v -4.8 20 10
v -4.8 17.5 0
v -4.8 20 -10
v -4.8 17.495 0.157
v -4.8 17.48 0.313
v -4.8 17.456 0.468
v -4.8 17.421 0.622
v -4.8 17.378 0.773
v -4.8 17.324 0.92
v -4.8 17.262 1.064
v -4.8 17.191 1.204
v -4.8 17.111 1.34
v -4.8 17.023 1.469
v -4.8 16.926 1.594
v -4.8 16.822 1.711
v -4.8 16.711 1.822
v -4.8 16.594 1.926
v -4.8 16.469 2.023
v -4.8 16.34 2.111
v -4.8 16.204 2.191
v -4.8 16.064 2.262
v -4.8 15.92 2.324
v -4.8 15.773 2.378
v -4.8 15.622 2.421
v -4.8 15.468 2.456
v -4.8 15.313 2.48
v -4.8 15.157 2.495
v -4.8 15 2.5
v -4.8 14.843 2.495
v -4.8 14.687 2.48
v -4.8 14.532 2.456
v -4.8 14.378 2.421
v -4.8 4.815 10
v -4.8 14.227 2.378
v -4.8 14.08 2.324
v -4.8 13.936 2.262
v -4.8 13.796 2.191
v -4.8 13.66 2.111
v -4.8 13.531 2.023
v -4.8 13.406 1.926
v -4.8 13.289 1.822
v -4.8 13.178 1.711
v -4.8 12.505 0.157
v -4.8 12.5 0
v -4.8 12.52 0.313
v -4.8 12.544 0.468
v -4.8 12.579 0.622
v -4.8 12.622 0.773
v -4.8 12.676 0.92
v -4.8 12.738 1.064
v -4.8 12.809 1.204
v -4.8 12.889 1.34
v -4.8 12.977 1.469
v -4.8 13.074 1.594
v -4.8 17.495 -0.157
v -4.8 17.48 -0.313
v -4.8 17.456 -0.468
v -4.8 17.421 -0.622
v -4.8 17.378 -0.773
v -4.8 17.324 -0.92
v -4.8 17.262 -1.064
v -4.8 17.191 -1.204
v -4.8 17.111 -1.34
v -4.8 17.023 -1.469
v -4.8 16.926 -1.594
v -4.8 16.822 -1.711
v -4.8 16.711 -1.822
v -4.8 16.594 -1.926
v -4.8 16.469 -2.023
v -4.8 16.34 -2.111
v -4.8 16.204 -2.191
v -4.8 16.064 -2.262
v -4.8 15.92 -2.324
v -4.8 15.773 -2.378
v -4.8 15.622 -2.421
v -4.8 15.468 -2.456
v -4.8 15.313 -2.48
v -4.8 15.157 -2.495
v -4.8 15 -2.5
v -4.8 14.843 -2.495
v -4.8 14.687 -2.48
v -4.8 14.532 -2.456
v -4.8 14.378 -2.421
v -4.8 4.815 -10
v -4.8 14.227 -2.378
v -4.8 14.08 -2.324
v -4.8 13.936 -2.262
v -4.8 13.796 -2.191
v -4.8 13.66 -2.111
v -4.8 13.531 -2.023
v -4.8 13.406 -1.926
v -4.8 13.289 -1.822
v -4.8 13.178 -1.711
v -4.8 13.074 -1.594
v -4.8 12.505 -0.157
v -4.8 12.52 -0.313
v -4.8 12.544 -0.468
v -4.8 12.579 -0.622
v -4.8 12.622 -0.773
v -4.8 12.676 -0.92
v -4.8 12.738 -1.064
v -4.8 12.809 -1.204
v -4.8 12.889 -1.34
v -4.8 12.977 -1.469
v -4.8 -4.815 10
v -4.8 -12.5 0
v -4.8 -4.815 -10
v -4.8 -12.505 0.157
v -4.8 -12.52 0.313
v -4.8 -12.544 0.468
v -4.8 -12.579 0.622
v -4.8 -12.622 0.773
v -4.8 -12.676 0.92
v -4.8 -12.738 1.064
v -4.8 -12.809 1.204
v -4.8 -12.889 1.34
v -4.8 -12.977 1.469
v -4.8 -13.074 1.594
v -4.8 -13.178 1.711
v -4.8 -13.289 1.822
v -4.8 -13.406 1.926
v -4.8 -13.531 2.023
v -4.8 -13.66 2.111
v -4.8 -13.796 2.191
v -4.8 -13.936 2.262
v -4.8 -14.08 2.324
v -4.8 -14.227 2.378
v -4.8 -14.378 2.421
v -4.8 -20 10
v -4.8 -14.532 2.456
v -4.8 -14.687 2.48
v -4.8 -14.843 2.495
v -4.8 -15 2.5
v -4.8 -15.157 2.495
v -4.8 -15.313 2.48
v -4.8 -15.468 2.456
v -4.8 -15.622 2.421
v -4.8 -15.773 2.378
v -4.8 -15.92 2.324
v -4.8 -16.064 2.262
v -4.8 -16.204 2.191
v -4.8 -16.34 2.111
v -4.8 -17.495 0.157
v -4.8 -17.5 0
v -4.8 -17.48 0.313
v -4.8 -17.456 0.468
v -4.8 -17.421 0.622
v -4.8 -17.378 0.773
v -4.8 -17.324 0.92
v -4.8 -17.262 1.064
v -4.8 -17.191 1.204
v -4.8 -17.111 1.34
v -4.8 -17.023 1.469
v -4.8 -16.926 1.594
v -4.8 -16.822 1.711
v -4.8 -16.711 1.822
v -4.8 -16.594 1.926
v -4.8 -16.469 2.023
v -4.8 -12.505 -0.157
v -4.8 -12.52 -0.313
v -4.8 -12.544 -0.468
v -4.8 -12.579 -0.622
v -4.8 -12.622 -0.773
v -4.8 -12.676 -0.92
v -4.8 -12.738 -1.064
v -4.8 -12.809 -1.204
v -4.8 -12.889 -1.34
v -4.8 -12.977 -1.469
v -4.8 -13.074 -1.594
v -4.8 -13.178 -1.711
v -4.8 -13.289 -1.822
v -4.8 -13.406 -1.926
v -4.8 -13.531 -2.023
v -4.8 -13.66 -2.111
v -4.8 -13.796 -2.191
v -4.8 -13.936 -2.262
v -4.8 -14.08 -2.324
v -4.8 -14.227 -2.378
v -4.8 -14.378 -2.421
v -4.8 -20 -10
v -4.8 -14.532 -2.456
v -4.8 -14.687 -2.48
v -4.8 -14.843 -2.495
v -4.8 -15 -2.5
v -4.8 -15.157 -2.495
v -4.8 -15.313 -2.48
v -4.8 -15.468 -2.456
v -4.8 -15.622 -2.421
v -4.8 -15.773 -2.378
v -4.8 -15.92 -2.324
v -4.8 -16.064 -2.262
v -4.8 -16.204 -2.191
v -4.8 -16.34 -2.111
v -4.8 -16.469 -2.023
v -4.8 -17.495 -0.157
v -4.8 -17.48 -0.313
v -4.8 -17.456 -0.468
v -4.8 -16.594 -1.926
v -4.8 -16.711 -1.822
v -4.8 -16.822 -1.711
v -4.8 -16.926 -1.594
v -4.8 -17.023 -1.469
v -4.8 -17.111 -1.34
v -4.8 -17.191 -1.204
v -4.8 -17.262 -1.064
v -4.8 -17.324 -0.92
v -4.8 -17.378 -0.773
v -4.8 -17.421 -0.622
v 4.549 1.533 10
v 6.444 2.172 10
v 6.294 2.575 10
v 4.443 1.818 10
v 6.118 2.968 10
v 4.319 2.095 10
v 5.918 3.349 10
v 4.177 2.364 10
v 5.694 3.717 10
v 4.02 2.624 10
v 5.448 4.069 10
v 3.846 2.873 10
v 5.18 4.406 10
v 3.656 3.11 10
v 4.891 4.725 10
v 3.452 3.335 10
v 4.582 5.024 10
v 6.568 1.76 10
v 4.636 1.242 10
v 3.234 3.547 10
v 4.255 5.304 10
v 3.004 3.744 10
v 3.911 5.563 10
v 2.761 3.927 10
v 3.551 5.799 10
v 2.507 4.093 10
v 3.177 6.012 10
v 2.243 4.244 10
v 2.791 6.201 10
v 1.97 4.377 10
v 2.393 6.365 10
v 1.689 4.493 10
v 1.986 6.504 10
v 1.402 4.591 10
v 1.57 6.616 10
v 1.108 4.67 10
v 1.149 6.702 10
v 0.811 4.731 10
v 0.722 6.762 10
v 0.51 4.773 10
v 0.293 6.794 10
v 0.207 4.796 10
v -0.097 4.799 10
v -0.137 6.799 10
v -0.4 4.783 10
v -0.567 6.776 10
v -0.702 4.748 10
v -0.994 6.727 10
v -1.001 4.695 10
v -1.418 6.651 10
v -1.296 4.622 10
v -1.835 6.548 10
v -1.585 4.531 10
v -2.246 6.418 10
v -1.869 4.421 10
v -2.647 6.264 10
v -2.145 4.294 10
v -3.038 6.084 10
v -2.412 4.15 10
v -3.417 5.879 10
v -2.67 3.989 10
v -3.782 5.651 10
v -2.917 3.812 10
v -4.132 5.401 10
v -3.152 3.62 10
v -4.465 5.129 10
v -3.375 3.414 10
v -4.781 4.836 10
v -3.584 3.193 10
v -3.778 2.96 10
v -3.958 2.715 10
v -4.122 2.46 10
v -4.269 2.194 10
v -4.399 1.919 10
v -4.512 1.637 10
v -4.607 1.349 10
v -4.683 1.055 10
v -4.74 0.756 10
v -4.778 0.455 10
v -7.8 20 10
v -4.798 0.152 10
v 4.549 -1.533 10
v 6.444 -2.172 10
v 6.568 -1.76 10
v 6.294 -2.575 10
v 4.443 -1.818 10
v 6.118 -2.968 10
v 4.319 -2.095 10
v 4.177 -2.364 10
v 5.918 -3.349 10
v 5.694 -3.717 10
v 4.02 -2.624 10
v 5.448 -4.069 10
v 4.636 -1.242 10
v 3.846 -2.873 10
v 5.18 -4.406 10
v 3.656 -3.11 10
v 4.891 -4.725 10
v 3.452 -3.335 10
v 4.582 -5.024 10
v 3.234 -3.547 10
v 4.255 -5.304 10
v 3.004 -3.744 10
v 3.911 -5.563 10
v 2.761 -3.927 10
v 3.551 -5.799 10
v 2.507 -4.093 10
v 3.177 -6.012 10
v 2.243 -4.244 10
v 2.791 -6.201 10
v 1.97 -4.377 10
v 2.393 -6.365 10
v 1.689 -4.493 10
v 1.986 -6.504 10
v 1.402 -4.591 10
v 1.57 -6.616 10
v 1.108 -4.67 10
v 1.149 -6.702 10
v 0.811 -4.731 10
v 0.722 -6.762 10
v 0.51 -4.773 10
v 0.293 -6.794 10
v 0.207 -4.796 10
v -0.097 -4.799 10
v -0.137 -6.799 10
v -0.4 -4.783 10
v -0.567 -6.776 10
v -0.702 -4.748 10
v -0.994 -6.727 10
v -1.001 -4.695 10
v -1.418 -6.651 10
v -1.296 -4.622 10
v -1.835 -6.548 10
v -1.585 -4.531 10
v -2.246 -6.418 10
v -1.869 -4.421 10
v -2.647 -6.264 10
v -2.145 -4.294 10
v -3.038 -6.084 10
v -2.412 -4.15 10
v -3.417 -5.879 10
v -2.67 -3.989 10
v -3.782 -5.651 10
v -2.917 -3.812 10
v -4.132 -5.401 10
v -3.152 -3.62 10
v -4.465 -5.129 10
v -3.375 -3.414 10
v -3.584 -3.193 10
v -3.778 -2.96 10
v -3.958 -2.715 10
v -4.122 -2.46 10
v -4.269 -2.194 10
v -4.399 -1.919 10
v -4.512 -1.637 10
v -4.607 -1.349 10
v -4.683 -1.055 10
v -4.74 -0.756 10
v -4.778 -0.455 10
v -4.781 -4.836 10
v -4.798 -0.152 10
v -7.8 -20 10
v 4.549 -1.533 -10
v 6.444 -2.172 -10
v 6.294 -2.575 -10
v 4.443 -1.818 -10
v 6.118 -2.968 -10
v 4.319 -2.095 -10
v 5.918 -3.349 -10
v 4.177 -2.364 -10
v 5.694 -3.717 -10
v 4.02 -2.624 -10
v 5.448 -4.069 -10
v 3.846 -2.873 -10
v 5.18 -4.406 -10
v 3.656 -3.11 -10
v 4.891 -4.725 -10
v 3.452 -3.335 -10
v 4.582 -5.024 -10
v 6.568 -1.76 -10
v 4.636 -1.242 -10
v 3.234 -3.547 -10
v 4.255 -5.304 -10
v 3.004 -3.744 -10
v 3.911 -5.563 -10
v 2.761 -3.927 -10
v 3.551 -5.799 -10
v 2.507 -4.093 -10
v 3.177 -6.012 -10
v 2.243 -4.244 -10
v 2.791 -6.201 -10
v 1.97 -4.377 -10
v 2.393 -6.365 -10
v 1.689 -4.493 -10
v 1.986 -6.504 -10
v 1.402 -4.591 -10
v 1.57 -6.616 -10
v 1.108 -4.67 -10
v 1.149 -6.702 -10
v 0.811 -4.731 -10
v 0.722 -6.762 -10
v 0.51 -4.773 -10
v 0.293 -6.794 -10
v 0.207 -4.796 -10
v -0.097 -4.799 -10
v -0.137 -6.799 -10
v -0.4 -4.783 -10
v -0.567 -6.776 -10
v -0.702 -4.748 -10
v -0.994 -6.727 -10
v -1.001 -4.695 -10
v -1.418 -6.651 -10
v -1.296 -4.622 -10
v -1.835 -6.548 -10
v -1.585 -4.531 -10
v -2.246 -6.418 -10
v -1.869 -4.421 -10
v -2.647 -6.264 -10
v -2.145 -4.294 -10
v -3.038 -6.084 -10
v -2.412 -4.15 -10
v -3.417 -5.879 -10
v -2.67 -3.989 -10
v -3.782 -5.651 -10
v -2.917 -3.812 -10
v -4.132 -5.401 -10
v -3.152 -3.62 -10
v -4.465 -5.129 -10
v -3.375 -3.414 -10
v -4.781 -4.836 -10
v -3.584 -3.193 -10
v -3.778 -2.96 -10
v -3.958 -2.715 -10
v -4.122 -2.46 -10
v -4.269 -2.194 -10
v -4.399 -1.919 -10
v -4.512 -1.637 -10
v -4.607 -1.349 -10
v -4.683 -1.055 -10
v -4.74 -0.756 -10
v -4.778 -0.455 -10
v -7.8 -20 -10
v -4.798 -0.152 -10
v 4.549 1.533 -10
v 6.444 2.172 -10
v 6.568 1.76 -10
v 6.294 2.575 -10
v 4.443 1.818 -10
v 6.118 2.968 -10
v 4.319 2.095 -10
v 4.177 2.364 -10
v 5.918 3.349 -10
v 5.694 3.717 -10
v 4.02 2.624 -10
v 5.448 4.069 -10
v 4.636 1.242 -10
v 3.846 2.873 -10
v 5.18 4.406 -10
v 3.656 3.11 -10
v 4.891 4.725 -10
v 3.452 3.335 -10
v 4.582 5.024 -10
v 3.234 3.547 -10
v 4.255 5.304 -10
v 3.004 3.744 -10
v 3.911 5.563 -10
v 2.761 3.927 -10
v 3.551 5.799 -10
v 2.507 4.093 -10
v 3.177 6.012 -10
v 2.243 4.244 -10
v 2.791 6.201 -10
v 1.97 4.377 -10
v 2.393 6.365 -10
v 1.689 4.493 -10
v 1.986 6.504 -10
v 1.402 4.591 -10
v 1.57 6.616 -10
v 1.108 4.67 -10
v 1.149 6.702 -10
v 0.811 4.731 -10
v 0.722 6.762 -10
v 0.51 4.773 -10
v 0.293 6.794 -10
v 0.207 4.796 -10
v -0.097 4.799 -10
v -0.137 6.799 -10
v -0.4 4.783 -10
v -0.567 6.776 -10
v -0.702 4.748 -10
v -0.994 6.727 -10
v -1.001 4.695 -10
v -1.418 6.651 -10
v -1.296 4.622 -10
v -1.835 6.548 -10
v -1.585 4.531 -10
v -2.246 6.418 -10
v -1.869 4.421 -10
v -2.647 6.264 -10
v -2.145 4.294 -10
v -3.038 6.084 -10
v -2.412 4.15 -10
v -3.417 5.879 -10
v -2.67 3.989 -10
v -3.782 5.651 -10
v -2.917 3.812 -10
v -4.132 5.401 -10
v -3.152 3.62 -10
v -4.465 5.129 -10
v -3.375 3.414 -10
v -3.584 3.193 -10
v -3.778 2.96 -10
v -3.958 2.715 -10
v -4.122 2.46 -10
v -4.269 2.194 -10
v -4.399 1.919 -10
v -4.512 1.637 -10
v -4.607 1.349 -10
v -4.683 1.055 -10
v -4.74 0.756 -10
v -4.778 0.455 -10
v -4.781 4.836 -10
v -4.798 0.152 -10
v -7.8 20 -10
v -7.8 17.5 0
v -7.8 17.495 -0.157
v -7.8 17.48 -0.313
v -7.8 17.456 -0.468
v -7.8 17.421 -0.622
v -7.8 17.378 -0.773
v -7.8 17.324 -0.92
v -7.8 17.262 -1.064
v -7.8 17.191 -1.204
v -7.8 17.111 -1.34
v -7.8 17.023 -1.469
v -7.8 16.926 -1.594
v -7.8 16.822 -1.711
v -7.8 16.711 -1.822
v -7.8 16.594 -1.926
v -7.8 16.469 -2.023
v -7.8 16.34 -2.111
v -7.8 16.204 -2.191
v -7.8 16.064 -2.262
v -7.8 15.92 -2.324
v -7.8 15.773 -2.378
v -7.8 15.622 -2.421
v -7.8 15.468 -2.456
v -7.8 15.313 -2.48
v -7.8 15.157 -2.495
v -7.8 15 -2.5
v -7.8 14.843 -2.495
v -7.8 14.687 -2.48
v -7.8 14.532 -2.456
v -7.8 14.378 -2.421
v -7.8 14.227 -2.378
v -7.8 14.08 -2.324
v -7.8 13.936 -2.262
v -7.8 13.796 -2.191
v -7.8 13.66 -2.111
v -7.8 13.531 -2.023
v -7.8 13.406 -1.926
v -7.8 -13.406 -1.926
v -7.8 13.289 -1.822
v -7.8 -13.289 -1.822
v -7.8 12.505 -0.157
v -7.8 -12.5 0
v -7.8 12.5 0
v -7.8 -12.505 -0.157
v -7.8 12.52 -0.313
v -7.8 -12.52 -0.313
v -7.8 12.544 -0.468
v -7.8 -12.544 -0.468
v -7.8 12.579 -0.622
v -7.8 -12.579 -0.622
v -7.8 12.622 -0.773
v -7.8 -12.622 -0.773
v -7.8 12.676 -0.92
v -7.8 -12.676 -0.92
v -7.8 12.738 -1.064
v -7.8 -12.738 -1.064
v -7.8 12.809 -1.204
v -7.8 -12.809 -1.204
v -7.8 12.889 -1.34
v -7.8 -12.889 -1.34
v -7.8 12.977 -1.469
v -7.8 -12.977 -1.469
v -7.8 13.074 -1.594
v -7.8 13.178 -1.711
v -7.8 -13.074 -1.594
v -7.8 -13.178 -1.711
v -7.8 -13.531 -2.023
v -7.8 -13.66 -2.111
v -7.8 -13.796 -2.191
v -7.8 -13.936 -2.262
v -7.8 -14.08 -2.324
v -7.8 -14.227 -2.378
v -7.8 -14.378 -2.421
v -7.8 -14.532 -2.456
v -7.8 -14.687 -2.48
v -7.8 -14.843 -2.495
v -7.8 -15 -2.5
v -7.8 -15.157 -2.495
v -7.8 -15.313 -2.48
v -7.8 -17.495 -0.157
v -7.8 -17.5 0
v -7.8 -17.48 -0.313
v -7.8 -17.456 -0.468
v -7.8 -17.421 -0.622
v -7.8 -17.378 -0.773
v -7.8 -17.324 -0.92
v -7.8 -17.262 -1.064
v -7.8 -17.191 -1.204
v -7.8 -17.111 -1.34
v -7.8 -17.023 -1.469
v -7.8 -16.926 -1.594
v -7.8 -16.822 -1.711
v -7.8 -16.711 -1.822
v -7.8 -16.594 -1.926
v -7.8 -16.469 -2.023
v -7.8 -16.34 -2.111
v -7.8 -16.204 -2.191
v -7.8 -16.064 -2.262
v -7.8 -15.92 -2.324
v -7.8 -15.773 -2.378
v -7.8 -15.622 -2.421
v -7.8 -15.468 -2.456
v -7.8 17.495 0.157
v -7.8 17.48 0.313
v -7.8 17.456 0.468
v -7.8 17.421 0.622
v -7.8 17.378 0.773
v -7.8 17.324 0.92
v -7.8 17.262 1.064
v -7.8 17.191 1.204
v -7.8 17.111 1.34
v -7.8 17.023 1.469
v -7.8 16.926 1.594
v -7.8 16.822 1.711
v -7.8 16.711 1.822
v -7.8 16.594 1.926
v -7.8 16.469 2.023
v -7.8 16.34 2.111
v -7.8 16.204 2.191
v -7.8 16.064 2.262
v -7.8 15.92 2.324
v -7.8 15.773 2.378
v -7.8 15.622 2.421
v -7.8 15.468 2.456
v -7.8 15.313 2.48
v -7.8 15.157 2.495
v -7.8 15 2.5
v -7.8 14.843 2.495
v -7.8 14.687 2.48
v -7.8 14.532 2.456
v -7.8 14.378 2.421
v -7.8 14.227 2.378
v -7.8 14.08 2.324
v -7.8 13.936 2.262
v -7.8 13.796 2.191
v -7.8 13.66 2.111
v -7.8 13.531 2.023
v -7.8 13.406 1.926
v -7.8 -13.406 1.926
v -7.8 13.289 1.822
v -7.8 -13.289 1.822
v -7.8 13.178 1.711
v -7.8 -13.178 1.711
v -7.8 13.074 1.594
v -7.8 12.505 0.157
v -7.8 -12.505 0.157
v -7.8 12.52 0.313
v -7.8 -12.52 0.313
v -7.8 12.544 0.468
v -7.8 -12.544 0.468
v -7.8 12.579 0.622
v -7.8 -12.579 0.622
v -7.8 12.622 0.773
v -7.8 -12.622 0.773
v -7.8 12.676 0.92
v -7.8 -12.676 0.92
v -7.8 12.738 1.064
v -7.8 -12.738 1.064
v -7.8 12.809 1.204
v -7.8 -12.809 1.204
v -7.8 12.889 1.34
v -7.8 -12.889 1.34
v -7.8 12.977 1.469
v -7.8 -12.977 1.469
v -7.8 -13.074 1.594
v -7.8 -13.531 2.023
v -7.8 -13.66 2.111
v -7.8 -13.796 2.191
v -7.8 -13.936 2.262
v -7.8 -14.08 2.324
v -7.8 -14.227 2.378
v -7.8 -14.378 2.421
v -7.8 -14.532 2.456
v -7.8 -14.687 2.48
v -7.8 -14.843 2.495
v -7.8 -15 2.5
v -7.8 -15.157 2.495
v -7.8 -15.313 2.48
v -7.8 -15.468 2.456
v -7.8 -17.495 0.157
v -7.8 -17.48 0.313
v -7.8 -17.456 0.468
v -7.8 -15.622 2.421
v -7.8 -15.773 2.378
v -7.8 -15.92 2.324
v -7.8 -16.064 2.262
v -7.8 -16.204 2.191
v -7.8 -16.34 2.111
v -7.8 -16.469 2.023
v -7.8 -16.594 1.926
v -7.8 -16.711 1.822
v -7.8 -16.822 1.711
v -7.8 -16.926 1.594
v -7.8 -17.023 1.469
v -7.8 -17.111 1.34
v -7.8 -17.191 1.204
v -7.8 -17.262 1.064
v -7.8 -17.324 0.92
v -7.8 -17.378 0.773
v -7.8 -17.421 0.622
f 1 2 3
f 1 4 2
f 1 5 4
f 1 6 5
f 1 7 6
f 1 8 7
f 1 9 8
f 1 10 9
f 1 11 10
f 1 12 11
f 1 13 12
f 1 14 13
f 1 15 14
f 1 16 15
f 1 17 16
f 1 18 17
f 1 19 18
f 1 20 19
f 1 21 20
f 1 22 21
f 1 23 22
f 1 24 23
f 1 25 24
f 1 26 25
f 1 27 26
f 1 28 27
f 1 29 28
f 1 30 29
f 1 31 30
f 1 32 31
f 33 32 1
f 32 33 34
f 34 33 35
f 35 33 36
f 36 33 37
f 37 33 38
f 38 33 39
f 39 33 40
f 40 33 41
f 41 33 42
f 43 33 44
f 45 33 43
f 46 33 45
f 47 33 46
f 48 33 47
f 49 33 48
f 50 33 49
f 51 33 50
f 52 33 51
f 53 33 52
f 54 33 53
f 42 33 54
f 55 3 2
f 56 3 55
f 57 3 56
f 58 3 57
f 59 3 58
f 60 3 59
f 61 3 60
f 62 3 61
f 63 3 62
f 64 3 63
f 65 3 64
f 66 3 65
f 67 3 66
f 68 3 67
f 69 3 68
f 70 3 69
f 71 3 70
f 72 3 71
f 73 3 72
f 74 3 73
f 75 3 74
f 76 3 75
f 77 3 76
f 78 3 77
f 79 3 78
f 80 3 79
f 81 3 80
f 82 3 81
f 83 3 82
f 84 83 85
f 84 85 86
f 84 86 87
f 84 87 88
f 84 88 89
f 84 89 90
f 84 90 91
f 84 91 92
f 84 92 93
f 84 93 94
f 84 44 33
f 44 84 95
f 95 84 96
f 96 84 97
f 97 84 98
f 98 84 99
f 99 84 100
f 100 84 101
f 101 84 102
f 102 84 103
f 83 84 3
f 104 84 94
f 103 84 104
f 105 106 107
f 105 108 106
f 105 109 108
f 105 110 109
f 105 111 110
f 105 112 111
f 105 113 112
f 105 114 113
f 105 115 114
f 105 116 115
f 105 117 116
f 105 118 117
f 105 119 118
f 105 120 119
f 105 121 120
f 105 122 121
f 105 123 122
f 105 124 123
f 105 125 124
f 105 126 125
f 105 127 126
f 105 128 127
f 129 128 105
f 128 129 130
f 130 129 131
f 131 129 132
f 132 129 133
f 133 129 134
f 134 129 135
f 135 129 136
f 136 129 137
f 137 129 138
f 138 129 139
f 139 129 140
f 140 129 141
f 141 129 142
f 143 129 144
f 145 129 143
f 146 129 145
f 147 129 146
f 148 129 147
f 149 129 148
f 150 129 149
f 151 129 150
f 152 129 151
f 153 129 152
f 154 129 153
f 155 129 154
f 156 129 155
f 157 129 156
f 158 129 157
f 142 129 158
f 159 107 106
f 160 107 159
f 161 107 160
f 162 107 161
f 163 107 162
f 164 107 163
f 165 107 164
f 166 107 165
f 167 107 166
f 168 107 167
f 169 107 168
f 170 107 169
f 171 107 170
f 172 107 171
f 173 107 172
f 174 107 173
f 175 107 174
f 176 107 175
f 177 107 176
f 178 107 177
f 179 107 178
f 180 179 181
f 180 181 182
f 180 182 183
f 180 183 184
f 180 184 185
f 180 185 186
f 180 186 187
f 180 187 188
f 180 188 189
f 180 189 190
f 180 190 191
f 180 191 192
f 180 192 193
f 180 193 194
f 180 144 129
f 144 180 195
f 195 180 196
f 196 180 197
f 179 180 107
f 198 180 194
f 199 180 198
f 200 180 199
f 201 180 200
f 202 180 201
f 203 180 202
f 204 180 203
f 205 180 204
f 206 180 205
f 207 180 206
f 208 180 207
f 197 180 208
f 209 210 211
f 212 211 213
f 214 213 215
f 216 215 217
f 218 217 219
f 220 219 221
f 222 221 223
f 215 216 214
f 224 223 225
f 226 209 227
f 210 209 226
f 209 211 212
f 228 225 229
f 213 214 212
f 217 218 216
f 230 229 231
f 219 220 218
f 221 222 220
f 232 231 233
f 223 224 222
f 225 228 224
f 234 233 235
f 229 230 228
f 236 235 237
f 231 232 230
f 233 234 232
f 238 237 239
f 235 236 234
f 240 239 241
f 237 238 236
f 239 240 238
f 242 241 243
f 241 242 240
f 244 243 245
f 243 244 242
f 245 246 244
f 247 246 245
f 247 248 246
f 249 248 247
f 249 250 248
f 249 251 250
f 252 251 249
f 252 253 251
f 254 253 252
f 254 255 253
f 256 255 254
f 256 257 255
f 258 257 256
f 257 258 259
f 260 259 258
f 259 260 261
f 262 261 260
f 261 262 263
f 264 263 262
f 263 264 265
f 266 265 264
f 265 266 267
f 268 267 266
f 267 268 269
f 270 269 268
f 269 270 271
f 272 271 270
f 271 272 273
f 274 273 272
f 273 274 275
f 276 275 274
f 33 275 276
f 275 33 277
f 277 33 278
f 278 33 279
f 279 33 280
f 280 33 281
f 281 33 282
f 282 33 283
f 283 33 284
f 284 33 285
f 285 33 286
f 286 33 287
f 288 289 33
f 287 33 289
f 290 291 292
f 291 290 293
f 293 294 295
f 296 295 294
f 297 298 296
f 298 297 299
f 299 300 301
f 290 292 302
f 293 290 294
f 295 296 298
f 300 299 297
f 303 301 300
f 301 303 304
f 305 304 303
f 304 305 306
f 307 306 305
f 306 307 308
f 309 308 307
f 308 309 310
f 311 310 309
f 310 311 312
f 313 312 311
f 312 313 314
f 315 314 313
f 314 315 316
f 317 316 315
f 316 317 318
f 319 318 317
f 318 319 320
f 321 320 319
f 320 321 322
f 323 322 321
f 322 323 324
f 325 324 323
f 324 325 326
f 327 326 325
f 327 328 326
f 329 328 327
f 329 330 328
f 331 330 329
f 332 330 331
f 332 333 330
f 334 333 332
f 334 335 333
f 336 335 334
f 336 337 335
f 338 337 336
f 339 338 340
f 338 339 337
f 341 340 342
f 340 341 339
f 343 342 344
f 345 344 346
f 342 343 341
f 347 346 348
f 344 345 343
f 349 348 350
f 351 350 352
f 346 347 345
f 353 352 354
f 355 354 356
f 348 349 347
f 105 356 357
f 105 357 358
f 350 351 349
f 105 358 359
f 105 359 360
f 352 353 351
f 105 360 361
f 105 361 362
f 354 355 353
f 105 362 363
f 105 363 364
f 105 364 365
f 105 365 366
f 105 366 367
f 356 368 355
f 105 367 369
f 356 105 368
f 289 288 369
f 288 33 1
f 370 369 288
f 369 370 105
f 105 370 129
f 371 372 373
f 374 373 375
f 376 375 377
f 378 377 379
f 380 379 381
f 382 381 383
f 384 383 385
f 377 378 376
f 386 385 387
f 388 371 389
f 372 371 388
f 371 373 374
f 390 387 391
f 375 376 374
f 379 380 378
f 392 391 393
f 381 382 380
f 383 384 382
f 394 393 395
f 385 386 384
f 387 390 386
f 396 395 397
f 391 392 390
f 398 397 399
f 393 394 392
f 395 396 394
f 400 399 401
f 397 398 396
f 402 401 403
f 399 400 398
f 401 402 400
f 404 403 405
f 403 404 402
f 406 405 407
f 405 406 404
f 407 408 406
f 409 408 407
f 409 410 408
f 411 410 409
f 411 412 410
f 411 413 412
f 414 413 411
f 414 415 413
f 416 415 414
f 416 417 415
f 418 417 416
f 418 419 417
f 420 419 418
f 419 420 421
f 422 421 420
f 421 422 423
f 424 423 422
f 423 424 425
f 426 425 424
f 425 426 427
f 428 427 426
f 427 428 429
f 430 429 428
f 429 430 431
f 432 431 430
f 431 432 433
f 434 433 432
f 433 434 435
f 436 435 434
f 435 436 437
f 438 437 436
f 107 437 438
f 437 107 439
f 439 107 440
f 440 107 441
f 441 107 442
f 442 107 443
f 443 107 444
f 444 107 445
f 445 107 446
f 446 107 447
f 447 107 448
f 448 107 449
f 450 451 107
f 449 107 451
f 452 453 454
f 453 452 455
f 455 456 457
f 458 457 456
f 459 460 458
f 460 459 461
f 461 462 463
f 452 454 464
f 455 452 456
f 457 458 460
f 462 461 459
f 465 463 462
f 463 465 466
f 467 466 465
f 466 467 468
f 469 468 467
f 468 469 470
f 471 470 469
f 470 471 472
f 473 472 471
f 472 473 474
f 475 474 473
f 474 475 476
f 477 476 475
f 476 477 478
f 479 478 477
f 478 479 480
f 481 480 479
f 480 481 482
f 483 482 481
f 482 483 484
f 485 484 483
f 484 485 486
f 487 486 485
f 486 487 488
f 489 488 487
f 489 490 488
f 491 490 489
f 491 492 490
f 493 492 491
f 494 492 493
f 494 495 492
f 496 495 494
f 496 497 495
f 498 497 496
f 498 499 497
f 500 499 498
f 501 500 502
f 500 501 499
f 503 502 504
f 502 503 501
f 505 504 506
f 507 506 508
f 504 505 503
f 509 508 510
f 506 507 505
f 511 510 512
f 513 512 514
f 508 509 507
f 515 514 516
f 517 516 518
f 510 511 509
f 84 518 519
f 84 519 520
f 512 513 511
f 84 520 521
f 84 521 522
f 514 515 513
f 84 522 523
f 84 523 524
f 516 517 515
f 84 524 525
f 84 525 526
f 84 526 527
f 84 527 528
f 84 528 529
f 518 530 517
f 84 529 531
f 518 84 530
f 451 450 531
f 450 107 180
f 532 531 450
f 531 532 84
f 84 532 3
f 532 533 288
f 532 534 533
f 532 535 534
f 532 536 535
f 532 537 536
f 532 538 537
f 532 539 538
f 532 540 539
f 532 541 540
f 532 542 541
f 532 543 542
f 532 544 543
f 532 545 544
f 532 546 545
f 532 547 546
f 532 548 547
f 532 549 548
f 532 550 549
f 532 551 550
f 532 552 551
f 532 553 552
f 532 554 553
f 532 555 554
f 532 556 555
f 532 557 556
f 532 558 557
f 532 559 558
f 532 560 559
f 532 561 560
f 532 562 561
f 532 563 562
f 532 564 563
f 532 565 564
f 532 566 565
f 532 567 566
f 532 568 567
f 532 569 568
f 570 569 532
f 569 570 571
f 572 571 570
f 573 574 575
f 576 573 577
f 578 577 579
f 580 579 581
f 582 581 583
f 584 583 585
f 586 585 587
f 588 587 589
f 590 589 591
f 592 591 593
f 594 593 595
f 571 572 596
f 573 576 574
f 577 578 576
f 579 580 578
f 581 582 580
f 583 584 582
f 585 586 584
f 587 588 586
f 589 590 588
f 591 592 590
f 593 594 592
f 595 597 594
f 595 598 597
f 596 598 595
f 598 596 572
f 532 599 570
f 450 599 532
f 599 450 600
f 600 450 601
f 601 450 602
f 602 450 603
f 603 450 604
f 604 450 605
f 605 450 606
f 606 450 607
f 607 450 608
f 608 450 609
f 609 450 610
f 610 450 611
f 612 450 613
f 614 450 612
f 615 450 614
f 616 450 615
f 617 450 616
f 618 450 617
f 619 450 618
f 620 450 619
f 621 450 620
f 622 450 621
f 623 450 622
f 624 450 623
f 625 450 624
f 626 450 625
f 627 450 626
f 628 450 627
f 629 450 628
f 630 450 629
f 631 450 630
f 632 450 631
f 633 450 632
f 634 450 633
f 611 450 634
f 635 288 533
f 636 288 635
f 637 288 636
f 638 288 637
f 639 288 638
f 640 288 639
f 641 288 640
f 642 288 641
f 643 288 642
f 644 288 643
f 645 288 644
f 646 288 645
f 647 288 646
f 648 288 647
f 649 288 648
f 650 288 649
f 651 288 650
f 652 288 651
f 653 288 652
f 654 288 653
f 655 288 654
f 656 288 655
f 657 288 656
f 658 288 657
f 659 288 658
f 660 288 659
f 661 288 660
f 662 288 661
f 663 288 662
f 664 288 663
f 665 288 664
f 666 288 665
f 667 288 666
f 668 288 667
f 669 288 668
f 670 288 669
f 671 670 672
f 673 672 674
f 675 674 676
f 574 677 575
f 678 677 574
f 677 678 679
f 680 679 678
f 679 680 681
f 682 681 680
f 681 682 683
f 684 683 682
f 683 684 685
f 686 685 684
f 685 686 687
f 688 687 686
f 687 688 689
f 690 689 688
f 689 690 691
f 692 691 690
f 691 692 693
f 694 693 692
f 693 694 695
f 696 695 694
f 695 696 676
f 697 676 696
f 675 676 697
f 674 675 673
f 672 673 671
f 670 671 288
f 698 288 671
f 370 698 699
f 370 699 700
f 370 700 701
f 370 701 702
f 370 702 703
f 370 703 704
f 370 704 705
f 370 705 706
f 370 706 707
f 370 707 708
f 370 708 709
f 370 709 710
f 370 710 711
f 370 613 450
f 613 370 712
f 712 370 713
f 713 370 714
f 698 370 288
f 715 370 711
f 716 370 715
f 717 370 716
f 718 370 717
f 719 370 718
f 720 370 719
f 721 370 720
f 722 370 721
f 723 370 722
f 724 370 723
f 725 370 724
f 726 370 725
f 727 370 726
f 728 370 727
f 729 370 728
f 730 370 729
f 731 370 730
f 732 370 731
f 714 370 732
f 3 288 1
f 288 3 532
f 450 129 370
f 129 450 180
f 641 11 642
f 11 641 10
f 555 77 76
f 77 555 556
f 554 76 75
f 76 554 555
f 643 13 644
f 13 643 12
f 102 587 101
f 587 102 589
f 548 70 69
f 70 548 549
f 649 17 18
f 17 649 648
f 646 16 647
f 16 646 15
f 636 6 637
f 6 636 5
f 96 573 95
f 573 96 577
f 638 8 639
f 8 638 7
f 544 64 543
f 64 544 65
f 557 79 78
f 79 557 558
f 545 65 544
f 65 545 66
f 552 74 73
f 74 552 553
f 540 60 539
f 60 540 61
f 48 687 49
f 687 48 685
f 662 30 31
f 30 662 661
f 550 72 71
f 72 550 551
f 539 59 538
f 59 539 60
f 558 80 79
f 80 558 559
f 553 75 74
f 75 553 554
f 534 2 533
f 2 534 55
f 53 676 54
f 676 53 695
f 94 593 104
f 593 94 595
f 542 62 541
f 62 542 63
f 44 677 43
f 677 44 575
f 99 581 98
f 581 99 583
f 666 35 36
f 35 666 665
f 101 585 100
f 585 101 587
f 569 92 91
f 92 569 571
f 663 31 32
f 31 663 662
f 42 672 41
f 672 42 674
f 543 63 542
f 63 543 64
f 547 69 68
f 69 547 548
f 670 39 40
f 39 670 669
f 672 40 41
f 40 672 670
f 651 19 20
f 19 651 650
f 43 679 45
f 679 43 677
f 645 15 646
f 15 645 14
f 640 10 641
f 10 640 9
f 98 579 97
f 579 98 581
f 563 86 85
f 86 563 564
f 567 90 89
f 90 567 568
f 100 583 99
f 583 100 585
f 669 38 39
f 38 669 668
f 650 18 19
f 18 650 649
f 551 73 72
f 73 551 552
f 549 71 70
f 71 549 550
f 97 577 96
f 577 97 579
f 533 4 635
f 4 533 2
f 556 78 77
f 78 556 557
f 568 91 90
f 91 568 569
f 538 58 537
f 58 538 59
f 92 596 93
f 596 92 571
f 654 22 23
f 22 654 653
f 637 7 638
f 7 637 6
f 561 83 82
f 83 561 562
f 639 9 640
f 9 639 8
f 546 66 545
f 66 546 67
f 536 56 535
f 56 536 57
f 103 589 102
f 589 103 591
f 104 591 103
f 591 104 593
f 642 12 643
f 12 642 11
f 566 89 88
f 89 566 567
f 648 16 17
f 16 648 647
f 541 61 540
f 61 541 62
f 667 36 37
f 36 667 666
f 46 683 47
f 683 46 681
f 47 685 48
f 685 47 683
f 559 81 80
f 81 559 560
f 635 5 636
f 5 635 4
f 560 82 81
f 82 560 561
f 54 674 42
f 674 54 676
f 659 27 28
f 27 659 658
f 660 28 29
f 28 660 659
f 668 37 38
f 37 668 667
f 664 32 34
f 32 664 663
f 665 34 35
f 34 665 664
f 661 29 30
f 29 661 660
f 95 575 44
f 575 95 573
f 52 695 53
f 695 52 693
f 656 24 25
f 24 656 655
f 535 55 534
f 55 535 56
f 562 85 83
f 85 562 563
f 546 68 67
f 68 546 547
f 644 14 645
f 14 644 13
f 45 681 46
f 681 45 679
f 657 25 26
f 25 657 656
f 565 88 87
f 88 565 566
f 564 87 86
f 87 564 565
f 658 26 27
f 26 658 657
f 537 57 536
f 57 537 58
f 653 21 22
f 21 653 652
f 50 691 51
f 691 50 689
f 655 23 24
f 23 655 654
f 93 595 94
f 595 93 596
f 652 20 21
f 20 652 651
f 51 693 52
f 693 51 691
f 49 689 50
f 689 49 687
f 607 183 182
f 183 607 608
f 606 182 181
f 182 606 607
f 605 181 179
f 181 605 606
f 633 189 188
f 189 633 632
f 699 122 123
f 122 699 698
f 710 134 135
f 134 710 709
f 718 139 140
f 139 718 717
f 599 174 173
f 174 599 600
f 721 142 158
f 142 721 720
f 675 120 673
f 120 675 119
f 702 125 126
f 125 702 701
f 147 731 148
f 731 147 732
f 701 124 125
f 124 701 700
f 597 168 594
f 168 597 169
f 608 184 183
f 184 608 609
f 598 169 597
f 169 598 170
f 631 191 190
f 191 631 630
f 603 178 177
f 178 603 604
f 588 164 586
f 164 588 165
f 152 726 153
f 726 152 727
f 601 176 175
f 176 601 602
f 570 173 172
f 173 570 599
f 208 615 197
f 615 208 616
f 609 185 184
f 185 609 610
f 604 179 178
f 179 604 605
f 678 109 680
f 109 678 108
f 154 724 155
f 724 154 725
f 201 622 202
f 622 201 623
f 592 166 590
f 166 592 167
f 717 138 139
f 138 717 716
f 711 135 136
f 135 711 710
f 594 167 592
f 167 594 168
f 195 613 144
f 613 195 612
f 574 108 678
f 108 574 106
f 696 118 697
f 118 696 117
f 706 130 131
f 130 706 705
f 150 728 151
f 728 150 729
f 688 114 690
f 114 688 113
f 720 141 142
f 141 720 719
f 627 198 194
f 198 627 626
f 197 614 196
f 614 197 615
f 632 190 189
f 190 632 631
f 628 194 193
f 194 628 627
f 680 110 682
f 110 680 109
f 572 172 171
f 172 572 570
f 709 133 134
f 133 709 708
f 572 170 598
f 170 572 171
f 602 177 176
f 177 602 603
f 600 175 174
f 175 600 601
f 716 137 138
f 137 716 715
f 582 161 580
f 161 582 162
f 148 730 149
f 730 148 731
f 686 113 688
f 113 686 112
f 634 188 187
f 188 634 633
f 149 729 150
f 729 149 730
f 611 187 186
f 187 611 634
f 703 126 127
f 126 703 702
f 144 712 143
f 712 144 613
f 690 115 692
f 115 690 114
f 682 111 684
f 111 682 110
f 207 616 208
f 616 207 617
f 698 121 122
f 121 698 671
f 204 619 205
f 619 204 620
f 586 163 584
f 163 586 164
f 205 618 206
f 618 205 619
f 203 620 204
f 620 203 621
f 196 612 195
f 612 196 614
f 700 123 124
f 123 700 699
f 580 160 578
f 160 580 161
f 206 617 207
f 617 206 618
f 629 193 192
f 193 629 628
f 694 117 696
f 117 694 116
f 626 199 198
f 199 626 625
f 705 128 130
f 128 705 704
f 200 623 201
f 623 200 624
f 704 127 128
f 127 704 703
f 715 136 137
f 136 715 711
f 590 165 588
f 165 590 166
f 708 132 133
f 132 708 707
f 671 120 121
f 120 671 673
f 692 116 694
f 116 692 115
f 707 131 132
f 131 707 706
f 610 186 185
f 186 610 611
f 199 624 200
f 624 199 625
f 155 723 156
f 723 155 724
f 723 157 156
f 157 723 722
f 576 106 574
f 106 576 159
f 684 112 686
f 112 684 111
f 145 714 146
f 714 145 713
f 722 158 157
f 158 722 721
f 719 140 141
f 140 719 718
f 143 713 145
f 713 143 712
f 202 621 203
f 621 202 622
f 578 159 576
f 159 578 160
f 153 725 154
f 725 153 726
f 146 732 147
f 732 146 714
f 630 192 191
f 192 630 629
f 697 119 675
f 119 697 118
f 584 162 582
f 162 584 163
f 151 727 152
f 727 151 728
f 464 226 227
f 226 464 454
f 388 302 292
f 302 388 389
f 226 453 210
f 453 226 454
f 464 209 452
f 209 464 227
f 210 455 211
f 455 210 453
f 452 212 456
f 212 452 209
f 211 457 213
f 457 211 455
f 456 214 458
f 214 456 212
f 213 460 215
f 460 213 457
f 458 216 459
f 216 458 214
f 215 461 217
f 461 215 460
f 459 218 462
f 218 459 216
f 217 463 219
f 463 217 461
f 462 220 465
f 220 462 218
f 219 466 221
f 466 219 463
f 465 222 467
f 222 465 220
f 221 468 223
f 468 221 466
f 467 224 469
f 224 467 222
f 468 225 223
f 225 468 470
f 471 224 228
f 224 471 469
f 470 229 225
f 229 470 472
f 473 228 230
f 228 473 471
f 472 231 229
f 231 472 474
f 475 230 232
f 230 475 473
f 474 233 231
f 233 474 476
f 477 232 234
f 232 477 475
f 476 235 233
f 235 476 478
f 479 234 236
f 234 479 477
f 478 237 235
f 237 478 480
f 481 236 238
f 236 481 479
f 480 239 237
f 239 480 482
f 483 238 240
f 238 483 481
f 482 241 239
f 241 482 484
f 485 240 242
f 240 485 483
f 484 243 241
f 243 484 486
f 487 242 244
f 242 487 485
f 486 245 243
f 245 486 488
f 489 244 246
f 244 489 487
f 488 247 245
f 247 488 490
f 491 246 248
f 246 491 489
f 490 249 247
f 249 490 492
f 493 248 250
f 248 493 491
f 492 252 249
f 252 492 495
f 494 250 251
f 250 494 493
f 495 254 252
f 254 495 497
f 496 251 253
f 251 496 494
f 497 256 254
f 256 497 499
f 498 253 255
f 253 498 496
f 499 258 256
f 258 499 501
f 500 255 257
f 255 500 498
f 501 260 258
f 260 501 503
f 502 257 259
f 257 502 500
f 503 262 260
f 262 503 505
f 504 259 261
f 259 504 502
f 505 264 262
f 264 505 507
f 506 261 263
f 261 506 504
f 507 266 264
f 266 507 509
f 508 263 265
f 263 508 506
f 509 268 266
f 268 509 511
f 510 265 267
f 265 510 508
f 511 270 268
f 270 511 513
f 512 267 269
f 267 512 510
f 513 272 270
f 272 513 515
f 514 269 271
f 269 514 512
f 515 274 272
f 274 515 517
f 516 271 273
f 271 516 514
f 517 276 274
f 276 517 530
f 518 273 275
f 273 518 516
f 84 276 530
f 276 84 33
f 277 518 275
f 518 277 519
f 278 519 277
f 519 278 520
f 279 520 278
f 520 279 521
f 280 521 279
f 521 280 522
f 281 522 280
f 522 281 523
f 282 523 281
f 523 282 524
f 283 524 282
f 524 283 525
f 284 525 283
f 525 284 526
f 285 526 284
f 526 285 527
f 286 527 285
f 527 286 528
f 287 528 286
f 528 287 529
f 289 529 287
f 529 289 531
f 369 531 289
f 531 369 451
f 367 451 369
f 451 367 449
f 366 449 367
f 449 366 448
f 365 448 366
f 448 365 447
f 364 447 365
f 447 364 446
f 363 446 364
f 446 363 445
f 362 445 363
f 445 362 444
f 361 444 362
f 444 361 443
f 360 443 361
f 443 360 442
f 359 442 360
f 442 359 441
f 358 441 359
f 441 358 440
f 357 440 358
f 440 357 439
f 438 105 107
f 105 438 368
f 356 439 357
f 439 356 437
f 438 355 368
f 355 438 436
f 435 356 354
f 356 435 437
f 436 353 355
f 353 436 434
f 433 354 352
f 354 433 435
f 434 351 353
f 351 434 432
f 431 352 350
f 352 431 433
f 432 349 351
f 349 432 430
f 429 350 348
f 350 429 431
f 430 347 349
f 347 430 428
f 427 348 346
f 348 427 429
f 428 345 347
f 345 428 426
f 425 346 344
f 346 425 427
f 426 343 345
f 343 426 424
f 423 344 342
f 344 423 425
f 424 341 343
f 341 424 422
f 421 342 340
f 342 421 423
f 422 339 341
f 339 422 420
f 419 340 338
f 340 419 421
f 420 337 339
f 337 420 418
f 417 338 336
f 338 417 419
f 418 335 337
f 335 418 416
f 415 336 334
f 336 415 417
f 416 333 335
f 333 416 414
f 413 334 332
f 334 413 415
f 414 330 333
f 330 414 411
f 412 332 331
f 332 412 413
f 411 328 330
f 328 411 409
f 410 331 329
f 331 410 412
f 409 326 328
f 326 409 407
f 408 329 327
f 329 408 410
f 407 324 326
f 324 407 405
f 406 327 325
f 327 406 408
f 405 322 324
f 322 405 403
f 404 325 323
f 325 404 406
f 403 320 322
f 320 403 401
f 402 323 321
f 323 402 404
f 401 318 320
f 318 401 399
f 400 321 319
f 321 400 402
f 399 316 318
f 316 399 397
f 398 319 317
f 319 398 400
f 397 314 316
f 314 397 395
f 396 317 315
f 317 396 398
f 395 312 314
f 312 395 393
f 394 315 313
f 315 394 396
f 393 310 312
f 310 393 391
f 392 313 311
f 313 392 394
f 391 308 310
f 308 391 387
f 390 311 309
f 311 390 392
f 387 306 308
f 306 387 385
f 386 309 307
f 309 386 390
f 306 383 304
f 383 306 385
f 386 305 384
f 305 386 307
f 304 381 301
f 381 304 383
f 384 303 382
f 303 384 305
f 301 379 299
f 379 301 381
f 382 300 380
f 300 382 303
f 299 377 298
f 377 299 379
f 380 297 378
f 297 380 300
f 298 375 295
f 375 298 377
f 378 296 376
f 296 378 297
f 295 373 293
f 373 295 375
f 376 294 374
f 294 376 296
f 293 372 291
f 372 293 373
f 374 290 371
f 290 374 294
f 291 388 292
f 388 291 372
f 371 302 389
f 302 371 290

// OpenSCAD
// clamp dimensions
rodsize=10/2-.2;
height=20;
thickness=2;
gap_degrees=30;

// base dimesions
base_thickness=3;
base_length=40;

$fn=100;

rotate([0,0,gap_degrees/2])
  rotate_extrude(angle= 360 - gap_degrees)
    translate([rodsize+thickness/2,0,0])
      square([thickness, height],center=true);

translate([-(base_thickness/2) - rodsize,0,0])
  difference(){
      cube([base_thickness,base_length,height], center=true);

    // holes
    rotate([0,90,0])
      translate([0,base_length/2-5,0])
        cylinder(r=2.5,h=base_thickness+1,center=true);

    rotate([0,90,0])
      translate([0,-base_length/2+5,0])
        cylinder(r=2.5,h=base_thickness+1,center=true);
  }
  
